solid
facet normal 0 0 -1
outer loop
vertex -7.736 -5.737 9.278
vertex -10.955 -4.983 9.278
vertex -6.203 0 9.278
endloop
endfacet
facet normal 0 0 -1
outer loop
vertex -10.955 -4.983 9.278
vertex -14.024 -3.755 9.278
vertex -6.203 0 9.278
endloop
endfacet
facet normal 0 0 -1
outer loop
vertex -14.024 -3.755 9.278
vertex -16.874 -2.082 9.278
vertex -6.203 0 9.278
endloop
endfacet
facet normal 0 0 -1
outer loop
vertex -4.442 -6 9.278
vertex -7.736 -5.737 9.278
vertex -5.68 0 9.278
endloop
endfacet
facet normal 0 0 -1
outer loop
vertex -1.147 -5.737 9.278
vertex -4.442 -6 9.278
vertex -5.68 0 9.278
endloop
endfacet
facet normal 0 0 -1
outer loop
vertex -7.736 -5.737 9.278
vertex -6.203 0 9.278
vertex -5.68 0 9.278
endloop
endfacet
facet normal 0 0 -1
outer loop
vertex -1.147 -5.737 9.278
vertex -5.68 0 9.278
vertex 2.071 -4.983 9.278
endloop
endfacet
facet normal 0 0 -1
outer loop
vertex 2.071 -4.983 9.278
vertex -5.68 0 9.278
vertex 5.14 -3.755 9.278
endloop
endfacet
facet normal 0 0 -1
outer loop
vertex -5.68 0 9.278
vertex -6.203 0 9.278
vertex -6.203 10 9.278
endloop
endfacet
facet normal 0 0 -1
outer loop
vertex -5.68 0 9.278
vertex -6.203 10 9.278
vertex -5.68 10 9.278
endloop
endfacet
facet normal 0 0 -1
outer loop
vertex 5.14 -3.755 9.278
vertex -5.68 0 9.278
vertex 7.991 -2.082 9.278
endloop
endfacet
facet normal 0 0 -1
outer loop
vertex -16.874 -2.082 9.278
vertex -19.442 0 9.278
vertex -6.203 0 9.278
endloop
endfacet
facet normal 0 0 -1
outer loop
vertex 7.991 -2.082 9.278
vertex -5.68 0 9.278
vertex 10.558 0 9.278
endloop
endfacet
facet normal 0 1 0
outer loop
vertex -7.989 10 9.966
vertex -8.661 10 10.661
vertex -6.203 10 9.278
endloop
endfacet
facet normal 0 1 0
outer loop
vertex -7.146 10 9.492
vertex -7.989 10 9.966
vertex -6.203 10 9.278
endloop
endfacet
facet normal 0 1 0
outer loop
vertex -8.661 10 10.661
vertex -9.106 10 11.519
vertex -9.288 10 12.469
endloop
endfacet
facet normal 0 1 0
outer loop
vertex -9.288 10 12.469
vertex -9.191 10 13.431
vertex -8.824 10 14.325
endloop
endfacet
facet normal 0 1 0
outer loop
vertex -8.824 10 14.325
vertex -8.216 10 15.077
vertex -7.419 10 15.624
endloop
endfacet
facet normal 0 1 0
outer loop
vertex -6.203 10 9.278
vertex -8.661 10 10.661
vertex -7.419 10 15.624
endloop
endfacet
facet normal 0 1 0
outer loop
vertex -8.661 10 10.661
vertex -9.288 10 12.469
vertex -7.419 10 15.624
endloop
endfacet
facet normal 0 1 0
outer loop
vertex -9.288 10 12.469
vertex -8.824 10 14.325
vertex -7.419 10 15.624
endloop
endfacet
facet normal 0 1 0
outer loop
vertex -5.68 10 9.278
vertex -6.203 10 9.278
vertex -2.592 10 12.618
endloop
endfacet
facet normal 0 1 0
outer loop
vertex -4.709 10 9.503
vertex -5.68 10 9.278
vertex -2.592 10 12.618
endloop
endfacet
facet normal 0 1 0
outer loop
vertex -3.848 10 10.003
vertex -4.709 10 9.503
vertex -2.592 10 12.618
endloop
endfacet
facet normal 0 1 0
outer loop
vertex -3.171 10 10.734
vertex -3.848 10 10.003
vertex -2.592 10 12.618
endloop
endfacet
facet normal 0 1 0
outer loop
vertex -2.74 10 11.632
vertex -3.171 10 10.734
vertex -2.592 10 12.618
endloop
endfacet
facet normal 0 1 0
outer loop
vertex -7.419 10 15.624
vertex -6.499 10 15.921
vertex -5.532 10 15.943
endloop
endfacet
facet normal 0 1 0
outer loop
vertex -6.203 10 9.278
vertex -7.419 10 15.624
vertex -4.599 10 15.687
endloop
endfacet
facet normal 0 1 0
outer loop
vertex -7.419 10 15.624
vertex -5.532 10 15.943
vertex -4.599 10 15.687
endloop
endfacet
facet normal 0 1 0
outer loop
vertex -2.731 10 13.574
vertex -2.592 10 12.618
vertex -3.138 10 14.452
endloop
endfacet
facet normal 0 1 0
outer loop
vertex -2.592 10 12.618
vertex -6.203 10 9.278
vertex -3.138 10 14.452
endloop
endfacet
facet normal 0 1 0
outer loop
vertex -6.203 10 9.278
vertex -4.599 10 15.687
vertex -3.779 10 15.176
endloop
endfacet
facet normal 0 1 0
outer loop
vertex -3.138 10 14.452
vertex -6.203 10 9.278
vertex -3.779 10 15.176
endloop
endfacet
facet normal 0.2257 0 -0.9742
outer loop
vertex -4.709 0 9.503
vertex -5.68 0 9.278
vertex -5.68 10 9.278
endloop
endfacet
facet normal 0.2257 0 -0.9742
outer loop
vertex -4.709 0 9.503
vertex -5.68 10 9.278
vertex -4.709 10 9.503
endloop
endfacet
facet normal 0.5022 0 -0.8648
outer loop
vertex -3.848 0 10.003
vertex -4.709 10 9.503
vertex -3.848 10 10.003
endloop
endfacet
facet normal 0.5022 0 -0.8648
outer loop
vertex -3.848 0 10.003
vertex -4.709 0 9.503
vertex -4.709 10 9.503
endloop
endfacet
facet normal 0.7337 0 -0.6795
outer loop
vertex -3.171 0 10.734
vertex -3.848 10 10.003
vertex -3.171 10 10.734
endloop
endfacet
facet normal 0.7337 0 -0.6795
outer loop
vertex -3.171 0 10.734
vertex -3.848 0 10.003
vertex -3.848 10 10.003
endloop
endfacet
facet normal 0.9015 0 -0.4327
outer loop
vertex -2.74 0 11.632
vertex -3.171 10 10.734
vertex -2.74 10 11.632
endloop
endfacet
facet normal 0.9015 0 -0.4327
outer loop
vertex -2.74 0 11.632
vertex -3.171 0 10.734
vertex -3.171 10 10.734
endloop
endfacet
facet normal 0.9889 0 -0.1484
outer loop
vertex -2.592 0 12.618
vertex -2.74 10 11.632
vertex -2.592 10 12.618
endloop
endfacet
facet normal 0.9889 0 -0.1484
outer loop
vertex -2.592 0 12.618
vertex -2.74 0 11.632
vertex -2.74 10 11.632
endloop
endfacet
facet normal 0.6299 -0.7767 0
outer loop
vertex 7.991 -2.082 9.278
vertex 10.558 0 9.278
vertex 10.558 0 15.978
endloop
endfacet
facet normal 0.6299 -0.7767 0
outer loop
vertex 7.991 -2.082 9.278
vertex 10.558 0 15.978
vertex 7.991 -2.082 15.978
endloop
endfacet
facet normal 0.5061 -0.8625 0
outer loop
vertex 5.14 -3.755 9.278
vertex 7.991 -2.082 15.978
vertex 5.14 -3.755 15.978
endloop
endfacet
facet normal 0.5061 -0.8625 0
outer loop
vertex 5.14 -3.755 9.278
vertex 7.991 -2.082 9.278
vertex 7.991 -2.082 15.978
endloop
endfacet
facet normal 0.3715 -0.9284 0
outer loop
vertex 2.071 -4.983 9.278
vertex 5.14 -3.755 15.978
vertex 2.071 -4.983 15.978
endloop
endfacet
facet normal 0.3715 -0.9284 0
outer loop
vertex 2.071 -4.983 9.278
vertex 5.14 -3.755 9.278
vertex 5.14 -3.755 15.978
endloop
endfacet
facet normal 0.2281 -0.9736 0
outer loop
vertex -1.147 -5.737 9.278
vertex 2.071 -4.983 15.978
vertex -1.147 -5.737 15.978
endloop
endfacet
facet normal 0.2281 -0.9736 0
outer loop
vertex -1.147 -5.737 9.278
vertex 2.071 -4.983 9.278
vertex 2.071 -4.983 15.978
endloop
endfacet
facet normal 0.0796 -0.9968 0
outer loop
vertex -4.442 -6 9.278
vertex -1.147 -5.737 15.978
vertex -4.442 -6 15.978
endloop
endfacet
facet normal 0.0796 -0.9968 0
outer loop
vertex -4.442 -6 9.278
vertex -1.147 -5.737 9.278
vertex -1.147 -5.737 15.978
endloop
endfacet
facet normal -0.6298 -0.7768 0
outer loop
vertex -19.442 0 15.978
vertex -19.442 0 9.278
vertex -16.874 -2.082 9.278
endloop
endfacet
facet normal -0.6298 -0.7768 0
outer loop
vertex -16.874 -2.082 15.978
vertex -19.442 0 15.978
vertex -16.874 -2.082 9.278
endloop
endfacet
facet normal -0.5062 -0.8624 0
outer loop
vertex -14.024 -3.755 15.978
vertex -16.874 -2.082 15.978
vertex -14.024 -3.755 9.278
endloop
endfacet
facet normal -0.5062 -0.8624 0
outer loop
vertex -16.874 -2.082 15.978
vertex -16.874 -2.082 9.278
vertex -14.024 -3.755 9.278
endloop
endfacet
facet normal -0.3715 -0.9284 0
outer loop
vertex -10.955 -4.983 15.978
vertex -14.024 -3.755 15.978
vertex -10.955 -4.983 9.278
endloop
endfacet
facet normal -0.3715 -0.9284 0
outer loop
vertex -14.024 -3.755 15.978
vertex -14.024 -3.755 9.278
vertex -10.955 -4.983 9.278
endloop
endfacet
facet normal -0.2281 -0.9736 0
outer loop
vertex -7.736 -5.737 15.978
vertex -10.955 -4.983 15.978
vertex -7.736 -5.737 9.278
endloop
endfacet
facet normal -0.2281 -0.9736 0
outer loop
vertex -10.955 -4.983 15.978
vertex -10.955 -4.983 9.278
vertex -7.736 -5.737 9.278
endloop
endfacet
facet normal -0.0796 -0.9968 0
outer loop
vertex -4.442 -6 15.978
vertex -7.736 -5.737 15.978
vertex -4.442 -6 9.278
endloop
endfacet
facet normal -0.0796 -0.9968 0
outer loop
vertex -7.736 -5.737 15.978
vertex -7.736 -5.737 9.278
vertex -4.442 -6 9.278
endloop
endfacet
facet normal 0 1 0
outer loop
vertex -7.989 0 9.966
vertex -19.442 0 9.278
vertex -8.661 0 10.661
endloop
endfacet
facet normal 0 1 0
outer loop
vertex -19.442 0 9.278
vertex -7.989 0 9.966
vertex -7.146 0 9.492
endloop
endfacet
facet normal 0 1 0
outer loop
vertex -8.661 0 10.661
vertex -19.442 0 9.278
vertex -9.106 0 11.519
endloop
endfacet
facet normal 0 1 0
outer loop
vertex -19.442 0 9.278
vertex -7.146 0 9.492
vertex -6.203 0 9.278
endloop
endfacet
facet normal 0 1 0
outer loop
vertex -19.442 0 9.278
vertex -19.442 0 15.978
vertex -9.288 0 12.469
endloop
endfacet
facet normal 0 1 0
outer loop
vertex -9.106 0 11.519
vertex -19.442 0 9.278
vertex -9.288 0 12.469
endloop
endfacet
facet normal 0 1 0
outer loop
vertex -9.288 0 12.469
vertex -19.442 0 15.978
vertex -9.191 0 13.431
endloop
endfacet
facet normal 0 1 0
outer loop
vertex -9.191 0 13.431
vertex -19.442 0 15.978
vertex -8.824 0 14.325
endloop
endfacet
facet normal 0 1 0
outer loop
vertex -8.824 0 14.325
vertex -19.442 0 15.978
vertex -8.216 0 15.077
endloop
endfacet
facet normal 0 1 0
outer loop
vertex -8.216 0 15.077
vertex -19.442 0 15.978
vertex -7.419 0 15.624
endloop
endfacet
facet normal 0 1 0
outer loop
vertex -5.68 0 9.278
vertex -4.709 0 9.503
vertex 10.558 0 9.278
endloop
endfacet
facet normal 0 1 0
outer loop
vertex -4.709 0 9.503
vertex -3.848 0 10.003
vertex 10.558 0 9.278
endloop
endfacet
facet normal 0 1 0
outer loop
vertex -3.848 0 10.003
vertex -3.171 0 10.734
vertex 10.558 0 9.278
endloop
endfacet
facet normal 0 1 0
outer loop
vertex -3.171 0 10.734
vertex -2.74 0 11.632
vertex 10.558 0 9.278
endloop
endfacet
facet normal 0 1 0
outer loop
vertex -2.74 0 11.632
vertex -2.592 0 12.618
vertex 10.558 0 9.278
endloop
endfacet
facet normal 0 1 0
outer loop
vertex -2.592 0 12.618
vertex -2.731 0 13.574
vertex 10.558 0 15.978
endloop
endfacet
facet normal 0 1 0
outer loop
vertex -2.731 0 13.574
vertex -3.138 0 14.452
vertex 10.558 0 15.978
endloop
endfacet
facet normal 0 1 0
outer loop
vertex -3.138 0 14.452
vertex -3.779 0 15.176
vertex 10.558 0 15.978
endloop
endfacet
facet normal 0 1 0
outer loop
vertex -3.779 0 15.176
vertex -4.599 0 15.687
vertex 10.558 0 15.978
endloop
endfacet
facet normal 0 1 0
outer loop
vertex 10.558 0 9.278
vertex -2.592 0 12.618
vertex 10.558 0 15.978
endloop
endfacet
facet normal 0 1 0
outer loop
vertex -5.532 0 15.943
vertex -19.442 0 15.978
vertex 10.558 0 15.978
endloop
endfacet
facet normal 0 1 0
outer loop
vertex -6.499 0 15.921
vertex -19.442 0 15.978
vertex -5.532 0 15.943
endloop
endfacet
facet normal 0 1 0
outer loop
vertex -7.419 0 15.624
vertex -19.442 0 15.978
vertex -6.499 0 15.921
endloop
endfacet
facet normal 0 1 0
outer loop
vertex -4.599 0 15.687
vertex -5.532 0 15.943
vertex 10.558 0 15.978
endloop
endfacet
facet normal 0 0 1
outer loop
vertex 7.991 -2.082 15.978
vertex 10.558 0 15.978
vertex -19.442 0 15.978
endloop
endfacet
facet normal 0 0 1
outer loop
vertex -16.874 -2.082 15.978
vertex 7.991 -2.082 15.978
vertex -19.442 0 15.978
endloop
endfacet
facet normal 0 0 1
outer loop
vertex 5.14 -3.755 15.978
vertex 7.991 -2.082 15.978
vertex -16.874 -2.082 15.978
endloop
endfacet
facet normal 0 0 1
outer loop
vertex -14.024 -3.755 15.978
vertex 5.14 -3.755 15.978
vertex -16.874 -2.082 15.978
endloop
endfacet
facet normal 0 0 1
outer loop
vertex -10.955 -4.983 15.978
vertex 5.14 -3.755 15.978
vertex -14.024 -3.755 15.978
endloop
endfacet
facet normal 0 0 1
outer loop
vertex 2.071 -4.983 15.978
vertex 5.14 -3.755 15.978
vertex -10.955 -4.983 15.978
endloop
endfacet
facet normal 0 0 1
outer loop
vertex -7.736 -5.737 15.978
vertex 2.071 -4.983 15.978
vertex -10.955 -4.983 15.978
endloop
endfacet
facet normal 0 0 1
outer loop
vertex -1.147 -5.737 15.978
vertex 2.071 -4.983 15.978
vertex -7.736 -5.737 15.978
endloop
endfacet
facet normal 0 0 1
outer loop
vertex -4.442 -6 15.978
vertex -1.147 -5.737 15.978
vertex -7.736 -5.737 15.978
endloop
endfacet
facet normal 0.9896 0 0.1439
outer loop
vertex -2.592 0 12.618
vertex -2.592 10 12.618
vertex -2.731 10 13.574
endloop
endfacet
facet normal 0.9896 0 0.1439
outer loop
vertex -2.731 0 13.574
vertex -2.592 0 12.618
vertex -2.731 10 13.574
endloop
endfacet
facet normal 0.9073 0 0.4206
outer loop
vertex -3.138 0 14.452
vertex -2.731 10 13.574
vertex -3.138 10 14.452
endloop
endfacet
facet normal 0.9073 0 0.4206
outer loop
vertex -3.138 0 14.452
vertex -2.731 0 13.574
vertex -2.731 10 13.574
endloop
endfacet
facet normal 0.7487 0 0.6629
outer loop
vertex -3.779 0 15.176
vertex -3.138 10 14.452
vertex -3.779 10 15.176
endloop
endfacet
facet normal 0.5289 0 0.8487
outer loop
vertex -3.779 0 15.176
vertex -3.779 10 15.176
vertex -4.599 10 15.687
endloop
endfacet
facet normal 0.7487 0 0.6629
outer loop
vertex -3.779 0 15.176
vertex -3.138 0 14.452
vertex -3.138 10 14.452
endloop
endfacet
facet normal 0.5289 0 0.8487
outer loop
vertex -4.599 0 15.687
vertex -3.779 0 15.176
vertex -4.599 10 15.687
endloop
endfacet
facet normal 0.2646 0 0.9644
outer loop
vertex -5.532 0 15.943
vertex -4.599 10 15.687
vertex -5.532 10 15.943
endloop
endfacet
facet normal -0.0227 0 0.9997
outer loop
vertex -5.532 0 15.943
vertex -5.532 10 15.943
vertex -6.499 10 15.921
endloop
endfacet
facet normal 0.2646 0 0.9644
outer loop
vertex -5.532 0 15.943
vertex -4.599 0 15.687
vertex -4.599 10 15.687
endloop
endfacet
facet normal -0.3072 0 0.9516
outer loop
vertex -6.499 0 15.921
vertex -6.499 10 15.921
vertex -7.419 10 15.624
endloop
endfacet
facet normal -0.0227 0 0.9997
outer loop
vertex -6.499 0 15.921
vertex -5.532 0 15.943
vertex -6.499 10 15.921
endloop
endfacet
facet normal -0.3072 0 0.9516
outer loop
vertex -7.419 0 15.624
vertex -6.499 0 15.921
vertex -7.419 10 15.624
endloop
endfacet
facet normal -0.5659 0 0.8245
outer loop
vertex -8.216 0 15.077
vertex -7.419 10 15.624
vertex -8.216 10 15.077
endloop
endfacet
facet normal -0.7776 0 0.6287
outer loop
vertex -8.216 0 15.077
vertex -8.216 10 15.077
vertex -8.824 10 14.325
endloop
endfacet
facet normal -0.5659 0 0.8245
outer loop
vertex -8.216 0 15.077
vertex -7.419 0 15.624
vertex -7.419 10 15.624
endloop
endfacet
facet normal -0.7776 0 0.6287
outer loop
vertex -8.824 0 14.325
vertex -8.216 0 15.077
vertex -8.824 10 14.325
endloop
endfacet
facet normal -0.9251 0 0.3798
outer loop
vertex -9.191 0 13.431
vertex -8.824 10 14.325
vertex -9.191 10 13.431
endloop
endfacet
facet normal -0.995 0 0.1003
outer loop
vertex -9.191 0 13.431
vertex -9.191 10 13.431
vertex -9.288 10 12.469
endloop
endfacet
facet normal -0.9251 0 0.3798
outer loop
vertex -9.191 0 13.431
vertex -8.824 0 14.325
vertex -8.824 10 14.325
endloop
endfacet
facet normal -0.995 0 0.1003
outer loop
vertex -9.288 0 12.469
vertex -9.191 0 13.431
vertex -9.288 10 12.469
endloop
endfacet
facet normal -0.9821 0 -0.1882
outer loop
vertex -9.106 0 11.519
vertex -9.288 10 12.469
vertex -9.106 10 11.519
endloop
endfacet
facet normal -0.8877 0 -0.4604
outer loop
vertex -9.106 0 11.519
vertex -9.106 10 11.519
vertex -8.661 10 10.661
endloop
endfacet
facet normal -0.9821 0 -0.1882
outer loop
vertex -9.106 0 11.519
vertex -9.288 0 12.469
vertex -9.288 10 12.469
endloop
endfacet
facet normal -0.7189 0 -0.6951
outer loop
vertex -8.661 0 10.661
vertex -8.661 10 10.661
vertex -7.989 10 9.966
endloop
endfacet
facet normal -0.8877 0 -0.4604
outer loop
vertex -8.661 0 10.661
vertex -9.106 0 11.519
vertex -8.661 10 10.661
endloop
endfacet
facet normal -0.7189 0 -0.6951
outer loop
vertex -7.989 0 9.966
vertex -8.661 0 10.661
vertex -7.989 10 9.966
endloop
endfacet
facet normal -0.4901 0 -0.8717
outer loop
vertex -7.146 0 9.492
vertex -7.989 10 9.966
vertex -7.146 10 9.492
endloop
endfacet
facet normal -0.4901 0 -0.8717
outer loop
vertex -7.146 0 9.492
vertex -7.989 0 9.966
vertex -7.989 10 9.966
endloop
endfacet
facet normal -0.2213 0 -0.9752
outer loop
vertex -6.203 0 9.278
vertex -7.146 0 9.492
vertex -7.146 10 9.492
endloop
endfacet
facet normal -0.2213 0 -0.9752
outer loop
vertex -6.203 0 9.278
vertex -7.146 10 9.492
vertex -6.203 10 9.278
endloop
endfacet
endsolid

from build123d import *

# Parameters (mm, degrees)
F1_DEPTH    = 6
F2_DEPTH    = 10
F3_T1_DEPTH = 82.1983443527


# Not quite as in the source:
# - a fillet or chamfer that OpenCascade refuses, or shapes differently, is made with other operations: its cross-section is extruded or revolved along the edge and cut away or added


with BuildPart() as f1:
    # F0 (on Front) → F1 (new body)
    with BuildSketch(Plane.XZ):
        with BuildLine():
            Line((10.5583761781, 15.9778866861), (-19.4416238219, 15.9778866861))
            Line((-19.4416238219, 15.9778866861), (-19.4416238219, 9.2778866861))
            Line((-19.4416238219, 9.2778866861), (-6.2031285903, 9.2778866861))
            ThreePointArc((-6.2031285903, 9.2778866861), (-8.2160972802, 15.0771908879), (-2.5916238219, 12.6176644117))
            ThreePointArc((-2.5916238219, 12.6176644117), (-3.4820973456, 10.3431909533), (-5.6801190534, 9.2778866861))
            Line((-5.6801190534, 9.2778866861), (10.5583761781, 9.2778866861))
            Line((10.5583761781, 9.2778866861), (10.5583761781, 15.9778866861))
        make_face()
        with BuildLine():
            ThreePointArc((-2.5916238219, 12.6176644117), (-8.2160972802, 15.0771908879), (-6.2031285903, 9.2778866861))
            Line((-6.2031285903, 9.2778866861), (-5.6801190534, 9.2778866861))
            ThreePointArc((-5.6801190534, 9.2778866861), (-3.4820973456, 10.3431909533), (-2.5916238219, 12.6176644117))
        make_face()
    extrude(amount=F1_DEPTH)

    # F0 (on Front) → F2 (join)
    with BuildSketch(Plane.XZ):
        with BuildLine():
            ThreePointArc((-2.5916238219, 12.6176644117), (-8.2160972802, 15.0771908879), (-6.2031285903, 9.2778866861))
            Line((-6.2031285903, 9.2778866861), (-5.6801190534, 9.2778866861))
            ThreePointArc((-5.6801190534, 9.2778866861), (-3.4820973456, 10.3431909533), (-2.5916238219, 12.6176644117))
        make_face()
    extrude(amount=-F2_DEPTH)

    # F3: fillet of radius 22 on 2 edges, made by hand

    # F3_s2 → F3_t1 (cut)
    with BuildSketch(Plane.XY.offset(-28.4712854902)):
        with BuildLine():
            ThreePointArc((-19.4416238219, 0), (-12.4659933559, -4.4450483003), (-4.3419549513, -6))
            Line((-4.3419549513, -6), (-19.4416238219, -6))
            Line((-19.4416238219, -6), (-19.4416238219, 0))
        make_face()
        with BuildLine():
            ThreePointArc((10.5583761781, 0), (3.5827457122, -4.4450483003), (-4.5412926924, -6))
            Line((-4.5412926924, -6), (10.5583761781, -6))
            Line((10.5583761781, -6), (10.5583761781, 0))
        make_face()
    extrude(amount=F3_T1_DEPTH, mode=Mode.SUBTRACT)


solid = f1.part
